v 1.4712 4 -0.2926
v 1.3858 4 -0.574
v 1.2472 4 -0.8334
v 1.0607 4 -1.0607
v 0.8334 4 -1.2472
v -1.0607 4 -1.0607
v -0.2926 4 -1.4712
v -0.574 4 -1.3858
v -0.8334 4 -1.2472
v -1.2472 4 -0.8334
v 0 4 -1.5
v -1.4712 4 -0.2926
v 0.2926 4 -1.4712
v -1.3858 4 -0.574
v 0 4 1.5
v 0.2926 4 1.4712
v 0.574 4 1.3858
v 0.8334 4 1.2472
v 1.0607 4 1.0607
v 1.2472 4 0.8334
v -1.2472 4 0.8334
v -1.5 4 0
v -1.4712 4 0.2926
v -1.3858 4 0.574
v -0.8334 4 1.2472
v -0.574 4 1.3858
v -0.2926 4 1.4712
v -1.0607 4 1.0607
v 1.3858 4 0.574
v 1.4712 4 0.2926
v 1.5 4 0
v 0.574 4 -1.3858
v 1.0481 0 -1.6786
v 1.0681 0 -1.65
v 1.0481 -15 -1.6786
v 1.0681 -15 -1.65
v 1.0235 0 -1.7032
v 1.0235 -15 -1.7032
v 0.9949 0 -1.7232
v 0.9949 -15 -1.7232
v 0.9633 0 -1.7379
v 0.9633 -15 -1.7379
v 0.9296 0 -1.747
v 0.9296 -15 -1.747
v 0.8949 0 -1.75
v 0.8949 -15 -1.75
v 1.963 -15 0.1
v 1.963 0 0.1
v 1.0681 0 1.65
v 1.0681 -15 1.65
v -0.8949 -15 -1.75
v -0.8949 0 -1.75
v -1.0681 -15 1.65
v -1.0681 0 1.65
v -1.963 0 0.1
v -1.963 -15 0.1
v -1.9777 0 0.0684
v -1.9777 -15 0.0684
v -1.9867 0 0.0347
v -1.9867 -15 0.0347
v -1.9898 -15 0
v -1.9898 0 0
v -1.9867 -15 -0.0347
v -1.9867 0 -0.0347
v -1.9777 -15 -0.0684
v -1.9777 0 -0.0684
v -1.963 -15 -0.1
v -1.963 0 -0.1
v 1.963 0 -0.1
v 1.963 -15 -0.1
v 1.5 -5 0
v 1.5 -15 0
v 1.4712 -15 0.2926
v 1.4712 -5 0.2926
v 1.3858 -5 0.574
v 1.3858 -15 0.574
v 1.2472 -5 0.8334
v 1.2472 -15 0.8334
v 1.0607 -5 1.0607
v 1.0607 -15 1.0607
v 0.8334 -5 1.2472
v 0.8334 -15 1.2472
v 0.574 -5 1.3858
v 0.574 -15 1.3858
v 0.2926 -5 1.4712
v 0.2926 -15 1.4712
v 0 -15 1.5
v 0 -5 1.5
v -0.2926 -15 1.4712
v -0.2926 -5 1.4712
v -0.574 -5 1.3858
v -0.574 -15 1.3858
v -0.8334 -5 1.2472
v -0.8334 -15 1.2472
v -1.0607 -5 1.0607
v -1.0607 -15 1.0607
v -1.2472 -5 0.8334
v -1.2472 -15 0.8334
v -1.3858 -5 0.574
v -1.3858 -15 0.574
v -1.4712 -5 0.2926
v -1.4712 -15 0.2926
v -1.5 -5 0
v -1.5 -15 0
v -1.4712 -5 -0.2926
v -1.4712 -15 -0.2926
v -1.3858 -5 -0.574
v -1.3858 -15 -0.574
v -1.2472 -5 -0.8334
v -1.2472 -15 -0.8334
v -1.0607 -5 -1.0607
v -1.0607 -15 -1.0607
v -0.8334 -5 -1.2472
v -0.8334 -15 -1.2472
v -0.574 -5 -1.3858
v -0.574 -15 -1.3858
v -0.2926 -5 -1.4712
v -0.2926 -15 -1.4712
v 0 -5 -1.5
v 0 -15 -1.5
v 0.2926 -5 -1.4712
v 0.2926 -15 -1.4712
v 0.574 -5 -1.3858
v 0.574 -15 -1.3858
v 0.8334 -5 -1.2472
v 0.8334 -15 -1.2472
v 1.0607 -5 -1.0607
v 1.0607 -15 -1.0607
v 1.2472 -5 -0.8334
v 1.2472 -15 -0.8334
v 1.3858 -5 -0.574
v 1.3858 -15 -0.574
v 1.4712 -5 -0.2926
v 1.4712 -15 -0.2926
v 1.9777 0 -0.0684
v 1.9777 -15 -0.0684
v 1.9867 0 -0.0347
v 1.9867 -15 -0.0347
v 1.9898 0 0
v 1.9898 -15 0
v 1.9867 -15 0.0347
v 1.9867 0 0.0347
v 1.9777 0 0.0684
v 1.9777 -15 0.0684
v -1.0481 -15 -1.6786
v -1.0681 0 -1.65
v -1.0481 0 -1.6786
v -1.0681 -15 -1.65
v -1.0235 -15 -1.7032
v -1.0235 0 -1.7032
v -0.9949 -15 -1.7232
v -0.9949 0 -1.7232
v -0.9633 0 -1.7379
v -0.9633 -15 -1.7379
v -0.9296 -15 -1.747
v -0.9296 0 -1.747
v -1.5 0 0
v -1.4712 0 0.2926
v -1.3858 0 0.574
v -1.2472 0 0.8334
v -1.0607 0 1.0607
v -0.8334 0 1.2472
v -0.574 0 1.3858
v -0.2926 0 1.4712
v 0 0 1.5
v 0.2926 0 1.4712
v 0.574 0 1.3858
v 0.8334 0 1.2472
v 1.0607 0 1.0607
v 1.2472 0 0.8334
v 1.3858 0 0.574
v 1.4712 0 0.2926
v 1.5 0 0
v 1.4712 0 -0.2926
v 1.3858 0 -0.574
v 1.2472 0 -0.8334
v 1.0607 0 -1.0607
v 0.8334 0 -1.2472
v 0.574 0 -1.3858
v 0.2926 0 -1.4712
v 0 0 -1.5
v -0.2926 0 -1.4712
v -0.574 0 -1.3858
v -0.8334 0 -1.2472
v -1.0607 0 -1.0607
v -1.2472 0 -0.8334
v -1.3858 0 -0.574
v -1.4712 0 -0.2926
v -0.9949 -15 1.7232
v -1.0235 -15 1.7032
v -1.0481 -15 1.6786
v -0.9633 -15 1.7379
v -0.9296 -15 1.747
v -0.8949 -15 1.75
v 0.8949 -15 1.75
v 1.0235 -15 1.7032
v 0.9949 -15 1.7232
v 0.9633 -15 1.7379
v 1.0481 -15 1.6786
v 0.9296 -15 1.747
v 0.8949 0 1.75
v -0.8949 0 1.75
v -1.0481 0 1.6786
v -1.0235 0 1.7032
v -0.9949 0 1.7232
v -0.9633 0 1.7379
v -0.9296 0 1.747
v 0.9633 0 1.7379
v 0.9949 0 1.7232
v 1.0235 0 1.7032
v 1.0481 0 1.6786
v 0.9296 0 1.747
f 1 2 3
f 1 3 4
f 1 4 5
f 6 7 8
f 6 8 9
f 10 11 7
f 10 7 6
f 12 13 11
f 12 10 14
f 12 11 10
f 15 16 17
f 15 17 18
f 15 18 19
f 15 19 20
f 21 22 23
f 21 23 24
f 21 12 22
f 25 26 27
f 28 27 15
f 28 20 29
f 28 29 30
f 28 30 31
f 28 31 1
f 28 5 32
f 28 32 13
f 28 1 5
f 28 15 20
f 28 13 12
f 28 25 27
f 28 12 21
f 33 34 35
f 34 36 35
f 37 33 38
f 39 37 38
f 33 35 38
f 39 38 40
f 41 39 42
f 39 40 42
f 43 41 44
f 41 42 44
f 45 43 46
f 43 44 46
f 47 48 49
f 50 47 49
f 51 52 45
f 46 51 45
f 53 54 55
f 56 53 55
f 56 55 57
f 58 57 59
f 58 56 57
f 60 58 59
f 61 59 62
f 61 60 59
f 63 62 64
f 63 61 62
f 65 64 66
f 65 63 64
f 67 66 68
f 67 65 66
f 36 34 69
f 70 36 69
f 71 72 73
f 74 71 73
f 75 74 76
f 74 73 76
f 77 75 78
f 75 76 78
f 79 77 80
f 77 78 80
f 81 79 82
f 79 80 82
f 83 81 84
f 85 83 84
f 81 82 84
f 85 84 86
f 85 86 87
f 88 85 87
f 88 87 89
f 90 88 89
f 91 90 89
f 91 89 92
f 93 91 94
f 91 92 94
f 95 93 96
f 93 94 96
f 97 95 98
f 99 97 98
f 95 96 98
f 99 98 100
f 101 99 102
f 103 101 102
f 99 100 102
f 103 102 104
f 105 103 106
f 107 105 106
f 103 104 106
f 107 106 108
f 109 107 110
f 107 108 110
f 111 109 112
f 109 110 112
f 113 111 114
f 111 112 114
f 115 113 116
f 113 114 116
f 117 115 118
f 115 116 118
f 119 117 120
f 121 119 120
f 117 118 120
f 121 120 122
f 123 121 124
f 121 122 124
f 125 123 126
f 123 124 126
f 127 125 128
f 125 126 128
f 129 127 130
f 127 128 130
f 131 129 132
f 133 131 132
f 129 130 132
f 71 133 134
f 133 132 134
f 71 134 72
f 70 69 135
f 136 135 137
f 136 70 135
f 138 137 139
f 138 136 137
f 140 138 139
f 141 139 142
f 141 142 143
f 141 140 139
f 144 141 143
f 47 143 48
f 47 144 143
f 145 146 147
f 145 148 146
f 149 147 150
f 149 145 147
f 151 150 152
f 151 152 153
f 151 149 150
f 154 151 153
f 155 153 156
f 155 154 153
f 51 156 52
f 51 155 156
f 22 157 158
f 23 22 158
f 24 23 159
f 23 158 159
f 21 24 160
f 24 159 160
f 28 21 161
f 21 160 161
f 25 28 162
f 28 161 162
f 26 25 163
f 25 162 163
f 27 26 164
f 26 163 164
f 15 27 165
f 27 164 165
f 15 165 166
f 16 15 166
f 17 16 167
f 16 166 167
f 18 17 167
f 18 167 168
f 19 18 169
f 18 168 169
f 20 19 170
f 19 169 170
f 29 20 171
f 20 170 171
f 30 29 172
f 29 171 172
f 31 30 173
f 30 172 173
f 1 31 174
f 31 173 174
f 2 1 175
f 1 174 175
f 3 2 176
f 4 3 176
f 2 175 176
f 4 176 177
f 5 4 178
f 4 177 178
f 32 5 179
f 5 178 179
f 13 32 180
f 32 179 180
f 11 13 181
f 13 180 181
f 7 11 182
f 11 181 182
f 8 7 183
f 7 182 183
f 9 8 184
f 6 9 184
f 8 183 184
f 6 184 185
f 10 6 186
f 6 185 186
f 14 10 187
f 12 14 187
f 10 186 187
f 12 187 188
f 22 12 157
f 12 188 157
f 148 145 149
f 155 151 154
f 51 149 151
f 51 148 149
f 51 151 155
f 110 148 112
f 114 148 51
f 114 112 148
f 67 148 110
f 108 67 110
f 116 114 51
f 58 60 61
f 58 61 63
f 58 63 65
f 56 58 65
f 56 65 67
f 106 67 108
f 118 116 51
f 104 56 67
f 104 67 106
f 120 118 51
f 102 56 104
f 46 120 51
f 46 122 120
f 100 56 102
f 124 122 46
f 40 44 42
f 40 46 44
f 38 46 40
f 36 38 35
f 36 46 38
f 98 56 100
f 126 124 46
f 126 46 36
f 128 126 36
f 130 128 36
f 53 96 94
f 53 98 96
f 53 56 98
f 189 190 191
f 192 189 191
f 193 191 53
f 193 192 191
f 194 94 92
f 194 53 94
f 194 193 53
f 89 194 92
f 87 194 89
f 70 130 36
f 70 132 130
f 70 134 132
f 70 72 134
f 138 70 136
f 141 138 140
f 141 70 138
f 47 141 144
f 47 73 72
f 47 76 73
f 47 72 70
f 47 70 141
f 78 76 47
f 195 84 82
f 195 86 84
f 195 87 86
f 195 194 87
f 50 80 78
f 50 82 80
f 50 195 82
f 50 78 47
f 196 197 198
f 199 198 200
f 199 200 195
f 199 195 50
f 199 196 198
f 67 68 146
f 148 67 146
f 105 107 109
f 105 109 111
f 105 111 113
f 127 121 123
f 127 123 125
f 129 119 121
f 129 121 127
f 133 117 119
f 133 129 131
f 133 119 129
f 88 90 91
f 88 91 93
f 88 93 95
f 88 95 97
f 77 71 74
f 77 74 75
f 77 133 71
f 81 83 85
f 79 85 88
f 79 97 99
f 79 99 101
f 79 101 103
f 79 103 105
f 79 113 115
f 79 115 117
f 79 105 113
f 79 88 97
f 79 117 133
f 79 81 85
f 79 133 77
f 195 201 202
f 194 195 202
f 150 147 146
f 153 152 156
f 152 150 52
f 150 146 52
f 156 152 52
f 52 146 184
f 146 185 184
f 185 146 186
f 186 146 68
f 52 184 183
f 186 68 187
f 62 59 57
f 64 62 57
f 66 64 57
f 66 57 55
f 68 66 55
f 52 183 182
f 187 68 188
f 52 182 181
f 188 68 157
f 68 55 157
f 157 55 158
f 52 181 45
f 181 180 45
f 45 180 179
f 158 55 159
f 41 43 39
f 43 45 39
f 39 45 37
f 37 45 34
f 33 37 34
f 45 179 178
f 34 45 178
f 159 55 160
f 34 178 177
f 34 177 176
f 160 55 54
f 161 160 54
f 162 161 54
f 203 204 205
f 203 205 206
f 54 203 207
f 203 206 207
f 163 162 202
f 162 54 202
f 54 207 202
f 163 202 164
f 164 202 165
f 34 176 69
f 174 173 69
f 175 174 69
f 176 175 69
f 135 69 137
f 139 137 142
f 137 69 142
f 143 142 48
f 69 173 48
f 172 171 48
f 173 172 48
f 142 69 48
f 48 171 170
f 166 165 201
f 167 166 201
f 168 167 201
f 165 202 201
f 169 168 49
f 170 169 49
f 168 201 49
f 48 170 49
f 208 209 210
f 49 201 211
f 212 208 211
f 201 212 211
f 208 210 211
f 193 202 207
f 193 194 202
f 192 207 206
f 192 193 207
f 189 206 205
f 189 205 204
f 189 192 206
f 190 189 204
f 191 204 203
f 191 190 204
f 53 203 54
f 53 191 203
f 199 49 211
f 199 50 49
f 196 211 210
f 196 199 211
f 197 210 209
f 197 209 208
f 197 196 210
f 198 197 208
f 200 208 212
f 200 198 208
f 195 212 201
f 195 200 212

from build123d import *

# Parameters (mm, degrees)
F1_DEPTH = 15
F2_R     = 0.2
F3_R     = 1.5
F4_DEPTH = 10
F5_R     = 1.5
F6_DEPTH = 4


with BuildPart() as f1:
    # F0 (on Front) → F1 (new body)
    with BuildSketch(Plane.XZ):
        Polygon((1.0103629711, -1.75), (2.0207259422, 0), (1.0103629711, 1.75), (-1.0103629711, 1.75), (-2.0207259422, 0), (-1.0103629711, -1.75), align=None)
    extrude(amount=F1_DEPTH)

    # F2
    f2_edges = [f1.edges().sort_by_distance(p)[0] for p in [
        (-1.010363, -7.5, 1.75),
        (1.010363, -7.5, 1.75),
        (2.020726, -7.5, 0),
        (1.010363, -7.5, -1.75),
        (-1.010363, -7.5, -1.75),
        (-2.020726, -7.5, 0),
    ]]
    fillet(f2_edges, radius=F2_R)

    # F3 (on face) → F4 (cut)
    with BuildSketch(Plane.XZ.offset(15)):
        Circle(F3_R)
    extrude(amount=-F4_DEPTH, mode=Mode.SUBTRACT)

    # F5 (on face) → F6 (join)
    with BuildSketch(Plane(origin=(0, 0, 0), x_dir=(-1, 0, 0), z_dir=(0, 1, 0))):
        Circle(F5_R)
    extrude(amount=F6_DEPTH)


solid = f1.part
